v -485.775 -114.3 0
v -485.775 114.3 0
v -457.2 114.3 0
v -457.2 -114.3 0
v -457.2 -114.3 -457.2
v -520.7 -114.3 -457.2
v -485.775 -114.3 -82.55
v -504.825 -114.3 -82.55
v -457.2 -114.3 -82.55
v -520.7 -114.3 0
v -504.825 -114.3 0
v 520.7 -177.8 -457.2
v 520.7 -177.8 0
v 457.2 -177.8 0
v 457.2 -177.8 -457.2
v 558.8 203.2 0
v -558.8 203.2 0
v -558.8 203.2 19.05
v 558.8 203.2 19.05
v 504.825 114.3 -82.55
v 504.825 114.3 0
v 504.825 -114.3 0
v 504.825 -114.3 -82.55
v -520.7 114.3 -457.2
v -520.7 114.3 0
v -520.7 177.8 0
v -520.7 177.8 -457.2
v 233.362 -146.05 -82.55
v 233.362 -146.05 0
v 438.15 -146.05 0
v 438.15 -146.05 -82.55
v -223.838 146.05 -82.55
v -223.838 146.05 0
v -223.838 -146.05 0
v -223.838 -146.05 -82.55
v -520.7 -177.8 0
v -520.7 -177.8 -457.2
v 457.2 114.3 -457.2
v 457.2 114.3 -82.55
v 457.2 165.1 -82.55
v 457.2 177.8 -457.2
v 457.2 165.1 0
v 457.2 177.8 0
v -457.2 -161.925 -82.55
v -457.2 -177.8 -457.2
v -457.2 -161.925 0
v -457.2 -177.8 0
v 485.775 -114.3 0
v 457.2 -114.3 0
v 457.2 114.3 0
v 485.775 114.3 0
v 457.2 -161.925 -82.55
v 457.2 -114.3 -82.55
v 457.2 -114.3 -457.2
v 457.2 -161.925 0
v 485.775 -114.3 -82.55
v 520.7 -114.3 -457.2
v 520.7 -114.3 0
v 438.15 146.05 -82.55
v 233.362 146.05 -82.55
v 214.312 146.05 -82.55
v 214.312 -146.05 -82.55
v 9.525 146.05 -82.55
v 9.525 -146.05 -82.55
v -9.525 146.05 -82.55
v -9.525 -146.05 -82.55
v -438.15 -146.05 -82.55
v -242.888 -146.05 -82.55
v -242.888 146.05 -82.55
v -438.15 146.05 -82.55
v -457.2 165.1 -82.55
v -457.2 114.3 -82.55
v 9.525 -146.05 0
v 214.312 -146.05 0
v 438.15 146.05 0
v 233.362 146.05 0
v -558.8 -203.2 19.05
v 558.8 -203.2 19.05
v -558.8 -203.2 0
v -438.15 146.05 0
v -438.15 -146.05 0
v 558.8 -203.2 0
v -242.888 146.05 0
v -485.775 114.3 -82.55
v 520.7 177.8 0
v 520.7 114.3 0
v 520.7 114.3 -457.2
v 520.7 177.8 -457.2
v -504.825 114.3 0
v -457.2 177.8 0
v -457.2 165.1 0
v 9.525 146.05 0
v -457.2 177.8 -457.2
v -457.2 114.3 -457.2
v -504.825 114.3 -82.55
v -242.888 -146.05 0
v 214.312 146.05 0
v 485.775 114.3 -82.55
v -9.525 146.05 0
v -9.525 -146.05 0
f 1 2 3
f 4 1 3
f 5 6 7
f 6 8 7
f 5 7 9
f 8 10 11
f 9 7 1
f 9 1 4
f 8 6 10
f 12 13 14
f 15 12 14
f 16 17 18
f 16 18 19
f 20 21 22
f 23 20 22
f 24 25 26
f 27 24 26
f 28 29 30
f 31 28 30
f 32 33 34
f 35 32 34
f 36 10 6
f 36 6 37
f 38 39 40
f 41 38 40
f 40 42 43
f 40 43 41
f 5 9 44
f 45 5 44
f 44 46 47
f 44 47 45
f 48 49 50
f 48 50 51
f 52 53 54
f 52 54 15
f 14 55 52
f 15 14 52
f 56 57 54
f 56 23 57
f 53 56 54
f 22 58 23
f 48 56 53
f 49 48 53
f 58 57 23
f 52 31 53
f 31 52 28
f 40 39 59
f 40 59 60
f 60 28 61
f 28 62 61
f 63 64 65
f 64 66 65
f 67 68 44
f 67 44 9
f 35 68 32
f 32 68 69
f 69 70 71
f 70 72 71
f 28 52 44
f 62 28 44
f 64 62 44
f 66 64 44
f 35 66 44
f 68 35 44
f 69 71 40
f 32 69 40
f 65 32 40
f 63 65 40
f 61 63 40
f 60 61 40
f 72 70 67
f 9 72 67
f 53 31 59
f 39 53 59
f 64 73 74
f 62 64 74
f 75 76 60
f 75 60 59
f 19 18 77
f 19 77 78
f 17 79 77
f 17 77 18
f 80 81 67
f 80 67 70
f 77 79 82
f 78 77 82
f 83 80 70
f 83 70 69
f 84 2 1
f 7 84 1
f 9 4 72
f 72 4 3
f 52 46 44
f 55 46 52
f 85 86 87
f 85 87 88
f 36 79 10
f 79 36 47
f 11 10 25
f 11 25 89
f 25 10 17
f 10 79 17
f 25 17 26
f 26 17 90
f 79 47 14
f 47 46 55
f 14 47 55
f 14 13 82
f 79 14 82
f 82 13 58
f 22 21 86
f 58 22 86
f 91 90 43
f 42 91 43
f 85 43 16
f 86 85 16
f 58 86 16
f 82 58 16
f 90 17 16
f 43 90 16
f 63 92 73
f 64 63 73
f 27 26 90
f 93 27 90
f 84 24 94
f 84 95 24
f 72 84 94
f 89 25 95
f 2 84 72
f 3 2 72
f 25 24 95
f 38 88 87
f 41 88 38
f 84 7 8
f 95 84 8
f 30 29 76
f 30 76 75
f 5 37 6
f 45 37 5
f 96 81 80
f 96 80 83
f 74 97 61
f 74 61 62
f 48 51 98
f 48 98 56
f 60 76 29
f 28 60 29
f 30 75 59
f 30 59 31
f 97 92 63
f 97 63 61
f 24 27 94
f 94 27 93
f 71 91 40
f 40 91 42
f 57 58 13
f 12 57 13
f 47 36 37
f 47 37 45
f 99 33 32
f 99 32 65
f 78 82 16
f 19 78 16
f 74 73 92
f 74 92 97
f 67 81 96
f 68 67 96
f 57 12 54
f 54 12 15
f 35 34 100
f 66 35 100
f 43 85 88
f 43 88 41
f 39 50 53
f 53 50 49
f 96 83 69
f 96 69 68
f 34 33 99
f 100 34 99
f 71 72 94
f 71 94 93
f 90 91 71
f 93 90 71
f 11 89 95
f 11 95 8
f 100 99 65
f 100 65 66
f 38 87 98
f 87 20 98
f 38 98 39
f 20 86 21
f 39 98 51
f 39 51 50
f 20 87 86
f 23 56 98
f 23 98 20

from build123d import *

# Parameters (mm, degrees)
F0_W      = 1117.6
F0_H      = 406.4
F1_DEPTH  = 19.05
F2_W      = 63.5
F2_H      = 63.5
F3_DEPTH  = 457.2
F6_W      = 19.05
F6_H      = 228.6
F7_DEPTH  = 82.55
F9_W      = 914.4
F9_H      = 19.05
F10_DEPTH = 82.55
F11_W     = 914.4
F11_H     = 15.875
F12_DEPTH = 82.55
F13_W     = 292.1707866669
F13_H     = 82.55
F14_DEPTH = 19.05
F15_W     = 292.3078624487
F15_H     = 82.55
F16_DEPTH = 19.05
F17_W     = 19.05
F17_H     = 292.1
F18_DEPTH = 82.55
F19_W     = 19.05
F19_H     = 292.1
F20_DEPTH = 82.55
F21_W     = 19.05
F21_H     = 292.1
F22_DEPTH = 82.55


with BuildPart() as f1:
    # F0 (on Top) → F1 (new body)
    with BuildSketch(Plane.XY):
        Rectangle(F0_W, F0_H)
    extrude(amount=F1_DEPTH)

    # F2 (on face) → F3 (join)
    with BuildSketch(Plane(origin=(0, 0, 0), x_dir=(1, 0, 0), z_dir=(0, 0, -1))):
        with Locations((-488.95, 146.05)):
            Rectangle(F2_W, F2_H)
    extrude(amount=F3_DEPTH)

    # F4: F1 across plane


with BuildPart() as f1_1:
    add(f1.part)
    add(f1.part.mirror(Plane.XZ))

    # F5: F1 across plane


with BuildPart() as f1_2:
    add(f1_1.part)
    add(f1_1.part.mirror(Plane.YZ))

    # F6 (on face) → F7 (join)
    with BuildSketch(Plane(origin=(0, 0, 0), x_dir=(1, 0, 0), z_dir=(0, 0, -1))):
        with Locations((495.3, 0)):
            Rectangle(F6_W, F6_H)
    extrude(amount=F7_DEPTH)

    # F8: F1 across plane


with BuildPart() as f1_3:
    add(f1_2.part)
    add(f1_2.part.mirror(Plane.YZ))

    # F9 (on face) → F10 (join)
    with BuildSketch(Plane(origin=(0, 0, 0), x_dir=(1, 0, 0), z_dir=(0, 0, -1))):
        with Locations((0, -155.575)):
            Rectangle(F9_W, F9_H)
    extrude(amount=F10_DEPTH)

    # F11 (on face) → F12 (join)
    with BuildSketch(Plane(origin=(0, 0, 0), x_dir=(1, 0, 0), z_dir=(0, 0, -1))):
        with Locations((0, 153.9875)):
            Rectangle(F11_W, F11_H)
    extrude(amount=F12_DEPTH)

    # F13 (on face) → F14 (join)
    with BuildSketch(Plane(origin=(457.2, 0, 0), x_dir=(0, -1, 0), z_dir=(-1, 0, 0))):
        with Locations((0.0353933334, -41.275)):
            Rectangle(F13_W, F13_H)
    extrude(amount=F14_DEPTH)

    # F15 (on face) → F16 (join)
    with BuildSketch(Plane.YZ.offset(-457.2)):
        with Locations((0.1039312243, -41.275)):
            Rectangle(F15_W, F15_H)
    extrude(amount=F16_DEPTH)

    # F17 (on face) → F18 (join)
    with BuildSketch(Plane(origin=(0, 0, 0), x_dir=(1, 0, 0), z_dir=(0, 0, -1))):
        Rectangle(F17_W, F17_H)
    extrude(amount=F18_DEPTH)

    # F19 (on face) → F20 (join)
    with BuildSketch(Plane(origin=(0, 0, 0), x_dir=(1, 0, 0), z_dir=(0, 0, -1))):
        with Locations((-233.3625, 0)):
            Rectangle(F19_W, F19_H)
    extrude(amount=F20_DEPTH)

    # F21 (on face) → F22 (join)
    with BuildSketch(Plane(origin=(0, 0, 0), x_dir=(1, 0, 0), z_dir=(0, 0, -1))):
        with Locations((223.8375, 0)):
            Rectangle(F21_W, F21_H)
    extrude(amount=F22_DEPTH)


solid = f1_3.part
